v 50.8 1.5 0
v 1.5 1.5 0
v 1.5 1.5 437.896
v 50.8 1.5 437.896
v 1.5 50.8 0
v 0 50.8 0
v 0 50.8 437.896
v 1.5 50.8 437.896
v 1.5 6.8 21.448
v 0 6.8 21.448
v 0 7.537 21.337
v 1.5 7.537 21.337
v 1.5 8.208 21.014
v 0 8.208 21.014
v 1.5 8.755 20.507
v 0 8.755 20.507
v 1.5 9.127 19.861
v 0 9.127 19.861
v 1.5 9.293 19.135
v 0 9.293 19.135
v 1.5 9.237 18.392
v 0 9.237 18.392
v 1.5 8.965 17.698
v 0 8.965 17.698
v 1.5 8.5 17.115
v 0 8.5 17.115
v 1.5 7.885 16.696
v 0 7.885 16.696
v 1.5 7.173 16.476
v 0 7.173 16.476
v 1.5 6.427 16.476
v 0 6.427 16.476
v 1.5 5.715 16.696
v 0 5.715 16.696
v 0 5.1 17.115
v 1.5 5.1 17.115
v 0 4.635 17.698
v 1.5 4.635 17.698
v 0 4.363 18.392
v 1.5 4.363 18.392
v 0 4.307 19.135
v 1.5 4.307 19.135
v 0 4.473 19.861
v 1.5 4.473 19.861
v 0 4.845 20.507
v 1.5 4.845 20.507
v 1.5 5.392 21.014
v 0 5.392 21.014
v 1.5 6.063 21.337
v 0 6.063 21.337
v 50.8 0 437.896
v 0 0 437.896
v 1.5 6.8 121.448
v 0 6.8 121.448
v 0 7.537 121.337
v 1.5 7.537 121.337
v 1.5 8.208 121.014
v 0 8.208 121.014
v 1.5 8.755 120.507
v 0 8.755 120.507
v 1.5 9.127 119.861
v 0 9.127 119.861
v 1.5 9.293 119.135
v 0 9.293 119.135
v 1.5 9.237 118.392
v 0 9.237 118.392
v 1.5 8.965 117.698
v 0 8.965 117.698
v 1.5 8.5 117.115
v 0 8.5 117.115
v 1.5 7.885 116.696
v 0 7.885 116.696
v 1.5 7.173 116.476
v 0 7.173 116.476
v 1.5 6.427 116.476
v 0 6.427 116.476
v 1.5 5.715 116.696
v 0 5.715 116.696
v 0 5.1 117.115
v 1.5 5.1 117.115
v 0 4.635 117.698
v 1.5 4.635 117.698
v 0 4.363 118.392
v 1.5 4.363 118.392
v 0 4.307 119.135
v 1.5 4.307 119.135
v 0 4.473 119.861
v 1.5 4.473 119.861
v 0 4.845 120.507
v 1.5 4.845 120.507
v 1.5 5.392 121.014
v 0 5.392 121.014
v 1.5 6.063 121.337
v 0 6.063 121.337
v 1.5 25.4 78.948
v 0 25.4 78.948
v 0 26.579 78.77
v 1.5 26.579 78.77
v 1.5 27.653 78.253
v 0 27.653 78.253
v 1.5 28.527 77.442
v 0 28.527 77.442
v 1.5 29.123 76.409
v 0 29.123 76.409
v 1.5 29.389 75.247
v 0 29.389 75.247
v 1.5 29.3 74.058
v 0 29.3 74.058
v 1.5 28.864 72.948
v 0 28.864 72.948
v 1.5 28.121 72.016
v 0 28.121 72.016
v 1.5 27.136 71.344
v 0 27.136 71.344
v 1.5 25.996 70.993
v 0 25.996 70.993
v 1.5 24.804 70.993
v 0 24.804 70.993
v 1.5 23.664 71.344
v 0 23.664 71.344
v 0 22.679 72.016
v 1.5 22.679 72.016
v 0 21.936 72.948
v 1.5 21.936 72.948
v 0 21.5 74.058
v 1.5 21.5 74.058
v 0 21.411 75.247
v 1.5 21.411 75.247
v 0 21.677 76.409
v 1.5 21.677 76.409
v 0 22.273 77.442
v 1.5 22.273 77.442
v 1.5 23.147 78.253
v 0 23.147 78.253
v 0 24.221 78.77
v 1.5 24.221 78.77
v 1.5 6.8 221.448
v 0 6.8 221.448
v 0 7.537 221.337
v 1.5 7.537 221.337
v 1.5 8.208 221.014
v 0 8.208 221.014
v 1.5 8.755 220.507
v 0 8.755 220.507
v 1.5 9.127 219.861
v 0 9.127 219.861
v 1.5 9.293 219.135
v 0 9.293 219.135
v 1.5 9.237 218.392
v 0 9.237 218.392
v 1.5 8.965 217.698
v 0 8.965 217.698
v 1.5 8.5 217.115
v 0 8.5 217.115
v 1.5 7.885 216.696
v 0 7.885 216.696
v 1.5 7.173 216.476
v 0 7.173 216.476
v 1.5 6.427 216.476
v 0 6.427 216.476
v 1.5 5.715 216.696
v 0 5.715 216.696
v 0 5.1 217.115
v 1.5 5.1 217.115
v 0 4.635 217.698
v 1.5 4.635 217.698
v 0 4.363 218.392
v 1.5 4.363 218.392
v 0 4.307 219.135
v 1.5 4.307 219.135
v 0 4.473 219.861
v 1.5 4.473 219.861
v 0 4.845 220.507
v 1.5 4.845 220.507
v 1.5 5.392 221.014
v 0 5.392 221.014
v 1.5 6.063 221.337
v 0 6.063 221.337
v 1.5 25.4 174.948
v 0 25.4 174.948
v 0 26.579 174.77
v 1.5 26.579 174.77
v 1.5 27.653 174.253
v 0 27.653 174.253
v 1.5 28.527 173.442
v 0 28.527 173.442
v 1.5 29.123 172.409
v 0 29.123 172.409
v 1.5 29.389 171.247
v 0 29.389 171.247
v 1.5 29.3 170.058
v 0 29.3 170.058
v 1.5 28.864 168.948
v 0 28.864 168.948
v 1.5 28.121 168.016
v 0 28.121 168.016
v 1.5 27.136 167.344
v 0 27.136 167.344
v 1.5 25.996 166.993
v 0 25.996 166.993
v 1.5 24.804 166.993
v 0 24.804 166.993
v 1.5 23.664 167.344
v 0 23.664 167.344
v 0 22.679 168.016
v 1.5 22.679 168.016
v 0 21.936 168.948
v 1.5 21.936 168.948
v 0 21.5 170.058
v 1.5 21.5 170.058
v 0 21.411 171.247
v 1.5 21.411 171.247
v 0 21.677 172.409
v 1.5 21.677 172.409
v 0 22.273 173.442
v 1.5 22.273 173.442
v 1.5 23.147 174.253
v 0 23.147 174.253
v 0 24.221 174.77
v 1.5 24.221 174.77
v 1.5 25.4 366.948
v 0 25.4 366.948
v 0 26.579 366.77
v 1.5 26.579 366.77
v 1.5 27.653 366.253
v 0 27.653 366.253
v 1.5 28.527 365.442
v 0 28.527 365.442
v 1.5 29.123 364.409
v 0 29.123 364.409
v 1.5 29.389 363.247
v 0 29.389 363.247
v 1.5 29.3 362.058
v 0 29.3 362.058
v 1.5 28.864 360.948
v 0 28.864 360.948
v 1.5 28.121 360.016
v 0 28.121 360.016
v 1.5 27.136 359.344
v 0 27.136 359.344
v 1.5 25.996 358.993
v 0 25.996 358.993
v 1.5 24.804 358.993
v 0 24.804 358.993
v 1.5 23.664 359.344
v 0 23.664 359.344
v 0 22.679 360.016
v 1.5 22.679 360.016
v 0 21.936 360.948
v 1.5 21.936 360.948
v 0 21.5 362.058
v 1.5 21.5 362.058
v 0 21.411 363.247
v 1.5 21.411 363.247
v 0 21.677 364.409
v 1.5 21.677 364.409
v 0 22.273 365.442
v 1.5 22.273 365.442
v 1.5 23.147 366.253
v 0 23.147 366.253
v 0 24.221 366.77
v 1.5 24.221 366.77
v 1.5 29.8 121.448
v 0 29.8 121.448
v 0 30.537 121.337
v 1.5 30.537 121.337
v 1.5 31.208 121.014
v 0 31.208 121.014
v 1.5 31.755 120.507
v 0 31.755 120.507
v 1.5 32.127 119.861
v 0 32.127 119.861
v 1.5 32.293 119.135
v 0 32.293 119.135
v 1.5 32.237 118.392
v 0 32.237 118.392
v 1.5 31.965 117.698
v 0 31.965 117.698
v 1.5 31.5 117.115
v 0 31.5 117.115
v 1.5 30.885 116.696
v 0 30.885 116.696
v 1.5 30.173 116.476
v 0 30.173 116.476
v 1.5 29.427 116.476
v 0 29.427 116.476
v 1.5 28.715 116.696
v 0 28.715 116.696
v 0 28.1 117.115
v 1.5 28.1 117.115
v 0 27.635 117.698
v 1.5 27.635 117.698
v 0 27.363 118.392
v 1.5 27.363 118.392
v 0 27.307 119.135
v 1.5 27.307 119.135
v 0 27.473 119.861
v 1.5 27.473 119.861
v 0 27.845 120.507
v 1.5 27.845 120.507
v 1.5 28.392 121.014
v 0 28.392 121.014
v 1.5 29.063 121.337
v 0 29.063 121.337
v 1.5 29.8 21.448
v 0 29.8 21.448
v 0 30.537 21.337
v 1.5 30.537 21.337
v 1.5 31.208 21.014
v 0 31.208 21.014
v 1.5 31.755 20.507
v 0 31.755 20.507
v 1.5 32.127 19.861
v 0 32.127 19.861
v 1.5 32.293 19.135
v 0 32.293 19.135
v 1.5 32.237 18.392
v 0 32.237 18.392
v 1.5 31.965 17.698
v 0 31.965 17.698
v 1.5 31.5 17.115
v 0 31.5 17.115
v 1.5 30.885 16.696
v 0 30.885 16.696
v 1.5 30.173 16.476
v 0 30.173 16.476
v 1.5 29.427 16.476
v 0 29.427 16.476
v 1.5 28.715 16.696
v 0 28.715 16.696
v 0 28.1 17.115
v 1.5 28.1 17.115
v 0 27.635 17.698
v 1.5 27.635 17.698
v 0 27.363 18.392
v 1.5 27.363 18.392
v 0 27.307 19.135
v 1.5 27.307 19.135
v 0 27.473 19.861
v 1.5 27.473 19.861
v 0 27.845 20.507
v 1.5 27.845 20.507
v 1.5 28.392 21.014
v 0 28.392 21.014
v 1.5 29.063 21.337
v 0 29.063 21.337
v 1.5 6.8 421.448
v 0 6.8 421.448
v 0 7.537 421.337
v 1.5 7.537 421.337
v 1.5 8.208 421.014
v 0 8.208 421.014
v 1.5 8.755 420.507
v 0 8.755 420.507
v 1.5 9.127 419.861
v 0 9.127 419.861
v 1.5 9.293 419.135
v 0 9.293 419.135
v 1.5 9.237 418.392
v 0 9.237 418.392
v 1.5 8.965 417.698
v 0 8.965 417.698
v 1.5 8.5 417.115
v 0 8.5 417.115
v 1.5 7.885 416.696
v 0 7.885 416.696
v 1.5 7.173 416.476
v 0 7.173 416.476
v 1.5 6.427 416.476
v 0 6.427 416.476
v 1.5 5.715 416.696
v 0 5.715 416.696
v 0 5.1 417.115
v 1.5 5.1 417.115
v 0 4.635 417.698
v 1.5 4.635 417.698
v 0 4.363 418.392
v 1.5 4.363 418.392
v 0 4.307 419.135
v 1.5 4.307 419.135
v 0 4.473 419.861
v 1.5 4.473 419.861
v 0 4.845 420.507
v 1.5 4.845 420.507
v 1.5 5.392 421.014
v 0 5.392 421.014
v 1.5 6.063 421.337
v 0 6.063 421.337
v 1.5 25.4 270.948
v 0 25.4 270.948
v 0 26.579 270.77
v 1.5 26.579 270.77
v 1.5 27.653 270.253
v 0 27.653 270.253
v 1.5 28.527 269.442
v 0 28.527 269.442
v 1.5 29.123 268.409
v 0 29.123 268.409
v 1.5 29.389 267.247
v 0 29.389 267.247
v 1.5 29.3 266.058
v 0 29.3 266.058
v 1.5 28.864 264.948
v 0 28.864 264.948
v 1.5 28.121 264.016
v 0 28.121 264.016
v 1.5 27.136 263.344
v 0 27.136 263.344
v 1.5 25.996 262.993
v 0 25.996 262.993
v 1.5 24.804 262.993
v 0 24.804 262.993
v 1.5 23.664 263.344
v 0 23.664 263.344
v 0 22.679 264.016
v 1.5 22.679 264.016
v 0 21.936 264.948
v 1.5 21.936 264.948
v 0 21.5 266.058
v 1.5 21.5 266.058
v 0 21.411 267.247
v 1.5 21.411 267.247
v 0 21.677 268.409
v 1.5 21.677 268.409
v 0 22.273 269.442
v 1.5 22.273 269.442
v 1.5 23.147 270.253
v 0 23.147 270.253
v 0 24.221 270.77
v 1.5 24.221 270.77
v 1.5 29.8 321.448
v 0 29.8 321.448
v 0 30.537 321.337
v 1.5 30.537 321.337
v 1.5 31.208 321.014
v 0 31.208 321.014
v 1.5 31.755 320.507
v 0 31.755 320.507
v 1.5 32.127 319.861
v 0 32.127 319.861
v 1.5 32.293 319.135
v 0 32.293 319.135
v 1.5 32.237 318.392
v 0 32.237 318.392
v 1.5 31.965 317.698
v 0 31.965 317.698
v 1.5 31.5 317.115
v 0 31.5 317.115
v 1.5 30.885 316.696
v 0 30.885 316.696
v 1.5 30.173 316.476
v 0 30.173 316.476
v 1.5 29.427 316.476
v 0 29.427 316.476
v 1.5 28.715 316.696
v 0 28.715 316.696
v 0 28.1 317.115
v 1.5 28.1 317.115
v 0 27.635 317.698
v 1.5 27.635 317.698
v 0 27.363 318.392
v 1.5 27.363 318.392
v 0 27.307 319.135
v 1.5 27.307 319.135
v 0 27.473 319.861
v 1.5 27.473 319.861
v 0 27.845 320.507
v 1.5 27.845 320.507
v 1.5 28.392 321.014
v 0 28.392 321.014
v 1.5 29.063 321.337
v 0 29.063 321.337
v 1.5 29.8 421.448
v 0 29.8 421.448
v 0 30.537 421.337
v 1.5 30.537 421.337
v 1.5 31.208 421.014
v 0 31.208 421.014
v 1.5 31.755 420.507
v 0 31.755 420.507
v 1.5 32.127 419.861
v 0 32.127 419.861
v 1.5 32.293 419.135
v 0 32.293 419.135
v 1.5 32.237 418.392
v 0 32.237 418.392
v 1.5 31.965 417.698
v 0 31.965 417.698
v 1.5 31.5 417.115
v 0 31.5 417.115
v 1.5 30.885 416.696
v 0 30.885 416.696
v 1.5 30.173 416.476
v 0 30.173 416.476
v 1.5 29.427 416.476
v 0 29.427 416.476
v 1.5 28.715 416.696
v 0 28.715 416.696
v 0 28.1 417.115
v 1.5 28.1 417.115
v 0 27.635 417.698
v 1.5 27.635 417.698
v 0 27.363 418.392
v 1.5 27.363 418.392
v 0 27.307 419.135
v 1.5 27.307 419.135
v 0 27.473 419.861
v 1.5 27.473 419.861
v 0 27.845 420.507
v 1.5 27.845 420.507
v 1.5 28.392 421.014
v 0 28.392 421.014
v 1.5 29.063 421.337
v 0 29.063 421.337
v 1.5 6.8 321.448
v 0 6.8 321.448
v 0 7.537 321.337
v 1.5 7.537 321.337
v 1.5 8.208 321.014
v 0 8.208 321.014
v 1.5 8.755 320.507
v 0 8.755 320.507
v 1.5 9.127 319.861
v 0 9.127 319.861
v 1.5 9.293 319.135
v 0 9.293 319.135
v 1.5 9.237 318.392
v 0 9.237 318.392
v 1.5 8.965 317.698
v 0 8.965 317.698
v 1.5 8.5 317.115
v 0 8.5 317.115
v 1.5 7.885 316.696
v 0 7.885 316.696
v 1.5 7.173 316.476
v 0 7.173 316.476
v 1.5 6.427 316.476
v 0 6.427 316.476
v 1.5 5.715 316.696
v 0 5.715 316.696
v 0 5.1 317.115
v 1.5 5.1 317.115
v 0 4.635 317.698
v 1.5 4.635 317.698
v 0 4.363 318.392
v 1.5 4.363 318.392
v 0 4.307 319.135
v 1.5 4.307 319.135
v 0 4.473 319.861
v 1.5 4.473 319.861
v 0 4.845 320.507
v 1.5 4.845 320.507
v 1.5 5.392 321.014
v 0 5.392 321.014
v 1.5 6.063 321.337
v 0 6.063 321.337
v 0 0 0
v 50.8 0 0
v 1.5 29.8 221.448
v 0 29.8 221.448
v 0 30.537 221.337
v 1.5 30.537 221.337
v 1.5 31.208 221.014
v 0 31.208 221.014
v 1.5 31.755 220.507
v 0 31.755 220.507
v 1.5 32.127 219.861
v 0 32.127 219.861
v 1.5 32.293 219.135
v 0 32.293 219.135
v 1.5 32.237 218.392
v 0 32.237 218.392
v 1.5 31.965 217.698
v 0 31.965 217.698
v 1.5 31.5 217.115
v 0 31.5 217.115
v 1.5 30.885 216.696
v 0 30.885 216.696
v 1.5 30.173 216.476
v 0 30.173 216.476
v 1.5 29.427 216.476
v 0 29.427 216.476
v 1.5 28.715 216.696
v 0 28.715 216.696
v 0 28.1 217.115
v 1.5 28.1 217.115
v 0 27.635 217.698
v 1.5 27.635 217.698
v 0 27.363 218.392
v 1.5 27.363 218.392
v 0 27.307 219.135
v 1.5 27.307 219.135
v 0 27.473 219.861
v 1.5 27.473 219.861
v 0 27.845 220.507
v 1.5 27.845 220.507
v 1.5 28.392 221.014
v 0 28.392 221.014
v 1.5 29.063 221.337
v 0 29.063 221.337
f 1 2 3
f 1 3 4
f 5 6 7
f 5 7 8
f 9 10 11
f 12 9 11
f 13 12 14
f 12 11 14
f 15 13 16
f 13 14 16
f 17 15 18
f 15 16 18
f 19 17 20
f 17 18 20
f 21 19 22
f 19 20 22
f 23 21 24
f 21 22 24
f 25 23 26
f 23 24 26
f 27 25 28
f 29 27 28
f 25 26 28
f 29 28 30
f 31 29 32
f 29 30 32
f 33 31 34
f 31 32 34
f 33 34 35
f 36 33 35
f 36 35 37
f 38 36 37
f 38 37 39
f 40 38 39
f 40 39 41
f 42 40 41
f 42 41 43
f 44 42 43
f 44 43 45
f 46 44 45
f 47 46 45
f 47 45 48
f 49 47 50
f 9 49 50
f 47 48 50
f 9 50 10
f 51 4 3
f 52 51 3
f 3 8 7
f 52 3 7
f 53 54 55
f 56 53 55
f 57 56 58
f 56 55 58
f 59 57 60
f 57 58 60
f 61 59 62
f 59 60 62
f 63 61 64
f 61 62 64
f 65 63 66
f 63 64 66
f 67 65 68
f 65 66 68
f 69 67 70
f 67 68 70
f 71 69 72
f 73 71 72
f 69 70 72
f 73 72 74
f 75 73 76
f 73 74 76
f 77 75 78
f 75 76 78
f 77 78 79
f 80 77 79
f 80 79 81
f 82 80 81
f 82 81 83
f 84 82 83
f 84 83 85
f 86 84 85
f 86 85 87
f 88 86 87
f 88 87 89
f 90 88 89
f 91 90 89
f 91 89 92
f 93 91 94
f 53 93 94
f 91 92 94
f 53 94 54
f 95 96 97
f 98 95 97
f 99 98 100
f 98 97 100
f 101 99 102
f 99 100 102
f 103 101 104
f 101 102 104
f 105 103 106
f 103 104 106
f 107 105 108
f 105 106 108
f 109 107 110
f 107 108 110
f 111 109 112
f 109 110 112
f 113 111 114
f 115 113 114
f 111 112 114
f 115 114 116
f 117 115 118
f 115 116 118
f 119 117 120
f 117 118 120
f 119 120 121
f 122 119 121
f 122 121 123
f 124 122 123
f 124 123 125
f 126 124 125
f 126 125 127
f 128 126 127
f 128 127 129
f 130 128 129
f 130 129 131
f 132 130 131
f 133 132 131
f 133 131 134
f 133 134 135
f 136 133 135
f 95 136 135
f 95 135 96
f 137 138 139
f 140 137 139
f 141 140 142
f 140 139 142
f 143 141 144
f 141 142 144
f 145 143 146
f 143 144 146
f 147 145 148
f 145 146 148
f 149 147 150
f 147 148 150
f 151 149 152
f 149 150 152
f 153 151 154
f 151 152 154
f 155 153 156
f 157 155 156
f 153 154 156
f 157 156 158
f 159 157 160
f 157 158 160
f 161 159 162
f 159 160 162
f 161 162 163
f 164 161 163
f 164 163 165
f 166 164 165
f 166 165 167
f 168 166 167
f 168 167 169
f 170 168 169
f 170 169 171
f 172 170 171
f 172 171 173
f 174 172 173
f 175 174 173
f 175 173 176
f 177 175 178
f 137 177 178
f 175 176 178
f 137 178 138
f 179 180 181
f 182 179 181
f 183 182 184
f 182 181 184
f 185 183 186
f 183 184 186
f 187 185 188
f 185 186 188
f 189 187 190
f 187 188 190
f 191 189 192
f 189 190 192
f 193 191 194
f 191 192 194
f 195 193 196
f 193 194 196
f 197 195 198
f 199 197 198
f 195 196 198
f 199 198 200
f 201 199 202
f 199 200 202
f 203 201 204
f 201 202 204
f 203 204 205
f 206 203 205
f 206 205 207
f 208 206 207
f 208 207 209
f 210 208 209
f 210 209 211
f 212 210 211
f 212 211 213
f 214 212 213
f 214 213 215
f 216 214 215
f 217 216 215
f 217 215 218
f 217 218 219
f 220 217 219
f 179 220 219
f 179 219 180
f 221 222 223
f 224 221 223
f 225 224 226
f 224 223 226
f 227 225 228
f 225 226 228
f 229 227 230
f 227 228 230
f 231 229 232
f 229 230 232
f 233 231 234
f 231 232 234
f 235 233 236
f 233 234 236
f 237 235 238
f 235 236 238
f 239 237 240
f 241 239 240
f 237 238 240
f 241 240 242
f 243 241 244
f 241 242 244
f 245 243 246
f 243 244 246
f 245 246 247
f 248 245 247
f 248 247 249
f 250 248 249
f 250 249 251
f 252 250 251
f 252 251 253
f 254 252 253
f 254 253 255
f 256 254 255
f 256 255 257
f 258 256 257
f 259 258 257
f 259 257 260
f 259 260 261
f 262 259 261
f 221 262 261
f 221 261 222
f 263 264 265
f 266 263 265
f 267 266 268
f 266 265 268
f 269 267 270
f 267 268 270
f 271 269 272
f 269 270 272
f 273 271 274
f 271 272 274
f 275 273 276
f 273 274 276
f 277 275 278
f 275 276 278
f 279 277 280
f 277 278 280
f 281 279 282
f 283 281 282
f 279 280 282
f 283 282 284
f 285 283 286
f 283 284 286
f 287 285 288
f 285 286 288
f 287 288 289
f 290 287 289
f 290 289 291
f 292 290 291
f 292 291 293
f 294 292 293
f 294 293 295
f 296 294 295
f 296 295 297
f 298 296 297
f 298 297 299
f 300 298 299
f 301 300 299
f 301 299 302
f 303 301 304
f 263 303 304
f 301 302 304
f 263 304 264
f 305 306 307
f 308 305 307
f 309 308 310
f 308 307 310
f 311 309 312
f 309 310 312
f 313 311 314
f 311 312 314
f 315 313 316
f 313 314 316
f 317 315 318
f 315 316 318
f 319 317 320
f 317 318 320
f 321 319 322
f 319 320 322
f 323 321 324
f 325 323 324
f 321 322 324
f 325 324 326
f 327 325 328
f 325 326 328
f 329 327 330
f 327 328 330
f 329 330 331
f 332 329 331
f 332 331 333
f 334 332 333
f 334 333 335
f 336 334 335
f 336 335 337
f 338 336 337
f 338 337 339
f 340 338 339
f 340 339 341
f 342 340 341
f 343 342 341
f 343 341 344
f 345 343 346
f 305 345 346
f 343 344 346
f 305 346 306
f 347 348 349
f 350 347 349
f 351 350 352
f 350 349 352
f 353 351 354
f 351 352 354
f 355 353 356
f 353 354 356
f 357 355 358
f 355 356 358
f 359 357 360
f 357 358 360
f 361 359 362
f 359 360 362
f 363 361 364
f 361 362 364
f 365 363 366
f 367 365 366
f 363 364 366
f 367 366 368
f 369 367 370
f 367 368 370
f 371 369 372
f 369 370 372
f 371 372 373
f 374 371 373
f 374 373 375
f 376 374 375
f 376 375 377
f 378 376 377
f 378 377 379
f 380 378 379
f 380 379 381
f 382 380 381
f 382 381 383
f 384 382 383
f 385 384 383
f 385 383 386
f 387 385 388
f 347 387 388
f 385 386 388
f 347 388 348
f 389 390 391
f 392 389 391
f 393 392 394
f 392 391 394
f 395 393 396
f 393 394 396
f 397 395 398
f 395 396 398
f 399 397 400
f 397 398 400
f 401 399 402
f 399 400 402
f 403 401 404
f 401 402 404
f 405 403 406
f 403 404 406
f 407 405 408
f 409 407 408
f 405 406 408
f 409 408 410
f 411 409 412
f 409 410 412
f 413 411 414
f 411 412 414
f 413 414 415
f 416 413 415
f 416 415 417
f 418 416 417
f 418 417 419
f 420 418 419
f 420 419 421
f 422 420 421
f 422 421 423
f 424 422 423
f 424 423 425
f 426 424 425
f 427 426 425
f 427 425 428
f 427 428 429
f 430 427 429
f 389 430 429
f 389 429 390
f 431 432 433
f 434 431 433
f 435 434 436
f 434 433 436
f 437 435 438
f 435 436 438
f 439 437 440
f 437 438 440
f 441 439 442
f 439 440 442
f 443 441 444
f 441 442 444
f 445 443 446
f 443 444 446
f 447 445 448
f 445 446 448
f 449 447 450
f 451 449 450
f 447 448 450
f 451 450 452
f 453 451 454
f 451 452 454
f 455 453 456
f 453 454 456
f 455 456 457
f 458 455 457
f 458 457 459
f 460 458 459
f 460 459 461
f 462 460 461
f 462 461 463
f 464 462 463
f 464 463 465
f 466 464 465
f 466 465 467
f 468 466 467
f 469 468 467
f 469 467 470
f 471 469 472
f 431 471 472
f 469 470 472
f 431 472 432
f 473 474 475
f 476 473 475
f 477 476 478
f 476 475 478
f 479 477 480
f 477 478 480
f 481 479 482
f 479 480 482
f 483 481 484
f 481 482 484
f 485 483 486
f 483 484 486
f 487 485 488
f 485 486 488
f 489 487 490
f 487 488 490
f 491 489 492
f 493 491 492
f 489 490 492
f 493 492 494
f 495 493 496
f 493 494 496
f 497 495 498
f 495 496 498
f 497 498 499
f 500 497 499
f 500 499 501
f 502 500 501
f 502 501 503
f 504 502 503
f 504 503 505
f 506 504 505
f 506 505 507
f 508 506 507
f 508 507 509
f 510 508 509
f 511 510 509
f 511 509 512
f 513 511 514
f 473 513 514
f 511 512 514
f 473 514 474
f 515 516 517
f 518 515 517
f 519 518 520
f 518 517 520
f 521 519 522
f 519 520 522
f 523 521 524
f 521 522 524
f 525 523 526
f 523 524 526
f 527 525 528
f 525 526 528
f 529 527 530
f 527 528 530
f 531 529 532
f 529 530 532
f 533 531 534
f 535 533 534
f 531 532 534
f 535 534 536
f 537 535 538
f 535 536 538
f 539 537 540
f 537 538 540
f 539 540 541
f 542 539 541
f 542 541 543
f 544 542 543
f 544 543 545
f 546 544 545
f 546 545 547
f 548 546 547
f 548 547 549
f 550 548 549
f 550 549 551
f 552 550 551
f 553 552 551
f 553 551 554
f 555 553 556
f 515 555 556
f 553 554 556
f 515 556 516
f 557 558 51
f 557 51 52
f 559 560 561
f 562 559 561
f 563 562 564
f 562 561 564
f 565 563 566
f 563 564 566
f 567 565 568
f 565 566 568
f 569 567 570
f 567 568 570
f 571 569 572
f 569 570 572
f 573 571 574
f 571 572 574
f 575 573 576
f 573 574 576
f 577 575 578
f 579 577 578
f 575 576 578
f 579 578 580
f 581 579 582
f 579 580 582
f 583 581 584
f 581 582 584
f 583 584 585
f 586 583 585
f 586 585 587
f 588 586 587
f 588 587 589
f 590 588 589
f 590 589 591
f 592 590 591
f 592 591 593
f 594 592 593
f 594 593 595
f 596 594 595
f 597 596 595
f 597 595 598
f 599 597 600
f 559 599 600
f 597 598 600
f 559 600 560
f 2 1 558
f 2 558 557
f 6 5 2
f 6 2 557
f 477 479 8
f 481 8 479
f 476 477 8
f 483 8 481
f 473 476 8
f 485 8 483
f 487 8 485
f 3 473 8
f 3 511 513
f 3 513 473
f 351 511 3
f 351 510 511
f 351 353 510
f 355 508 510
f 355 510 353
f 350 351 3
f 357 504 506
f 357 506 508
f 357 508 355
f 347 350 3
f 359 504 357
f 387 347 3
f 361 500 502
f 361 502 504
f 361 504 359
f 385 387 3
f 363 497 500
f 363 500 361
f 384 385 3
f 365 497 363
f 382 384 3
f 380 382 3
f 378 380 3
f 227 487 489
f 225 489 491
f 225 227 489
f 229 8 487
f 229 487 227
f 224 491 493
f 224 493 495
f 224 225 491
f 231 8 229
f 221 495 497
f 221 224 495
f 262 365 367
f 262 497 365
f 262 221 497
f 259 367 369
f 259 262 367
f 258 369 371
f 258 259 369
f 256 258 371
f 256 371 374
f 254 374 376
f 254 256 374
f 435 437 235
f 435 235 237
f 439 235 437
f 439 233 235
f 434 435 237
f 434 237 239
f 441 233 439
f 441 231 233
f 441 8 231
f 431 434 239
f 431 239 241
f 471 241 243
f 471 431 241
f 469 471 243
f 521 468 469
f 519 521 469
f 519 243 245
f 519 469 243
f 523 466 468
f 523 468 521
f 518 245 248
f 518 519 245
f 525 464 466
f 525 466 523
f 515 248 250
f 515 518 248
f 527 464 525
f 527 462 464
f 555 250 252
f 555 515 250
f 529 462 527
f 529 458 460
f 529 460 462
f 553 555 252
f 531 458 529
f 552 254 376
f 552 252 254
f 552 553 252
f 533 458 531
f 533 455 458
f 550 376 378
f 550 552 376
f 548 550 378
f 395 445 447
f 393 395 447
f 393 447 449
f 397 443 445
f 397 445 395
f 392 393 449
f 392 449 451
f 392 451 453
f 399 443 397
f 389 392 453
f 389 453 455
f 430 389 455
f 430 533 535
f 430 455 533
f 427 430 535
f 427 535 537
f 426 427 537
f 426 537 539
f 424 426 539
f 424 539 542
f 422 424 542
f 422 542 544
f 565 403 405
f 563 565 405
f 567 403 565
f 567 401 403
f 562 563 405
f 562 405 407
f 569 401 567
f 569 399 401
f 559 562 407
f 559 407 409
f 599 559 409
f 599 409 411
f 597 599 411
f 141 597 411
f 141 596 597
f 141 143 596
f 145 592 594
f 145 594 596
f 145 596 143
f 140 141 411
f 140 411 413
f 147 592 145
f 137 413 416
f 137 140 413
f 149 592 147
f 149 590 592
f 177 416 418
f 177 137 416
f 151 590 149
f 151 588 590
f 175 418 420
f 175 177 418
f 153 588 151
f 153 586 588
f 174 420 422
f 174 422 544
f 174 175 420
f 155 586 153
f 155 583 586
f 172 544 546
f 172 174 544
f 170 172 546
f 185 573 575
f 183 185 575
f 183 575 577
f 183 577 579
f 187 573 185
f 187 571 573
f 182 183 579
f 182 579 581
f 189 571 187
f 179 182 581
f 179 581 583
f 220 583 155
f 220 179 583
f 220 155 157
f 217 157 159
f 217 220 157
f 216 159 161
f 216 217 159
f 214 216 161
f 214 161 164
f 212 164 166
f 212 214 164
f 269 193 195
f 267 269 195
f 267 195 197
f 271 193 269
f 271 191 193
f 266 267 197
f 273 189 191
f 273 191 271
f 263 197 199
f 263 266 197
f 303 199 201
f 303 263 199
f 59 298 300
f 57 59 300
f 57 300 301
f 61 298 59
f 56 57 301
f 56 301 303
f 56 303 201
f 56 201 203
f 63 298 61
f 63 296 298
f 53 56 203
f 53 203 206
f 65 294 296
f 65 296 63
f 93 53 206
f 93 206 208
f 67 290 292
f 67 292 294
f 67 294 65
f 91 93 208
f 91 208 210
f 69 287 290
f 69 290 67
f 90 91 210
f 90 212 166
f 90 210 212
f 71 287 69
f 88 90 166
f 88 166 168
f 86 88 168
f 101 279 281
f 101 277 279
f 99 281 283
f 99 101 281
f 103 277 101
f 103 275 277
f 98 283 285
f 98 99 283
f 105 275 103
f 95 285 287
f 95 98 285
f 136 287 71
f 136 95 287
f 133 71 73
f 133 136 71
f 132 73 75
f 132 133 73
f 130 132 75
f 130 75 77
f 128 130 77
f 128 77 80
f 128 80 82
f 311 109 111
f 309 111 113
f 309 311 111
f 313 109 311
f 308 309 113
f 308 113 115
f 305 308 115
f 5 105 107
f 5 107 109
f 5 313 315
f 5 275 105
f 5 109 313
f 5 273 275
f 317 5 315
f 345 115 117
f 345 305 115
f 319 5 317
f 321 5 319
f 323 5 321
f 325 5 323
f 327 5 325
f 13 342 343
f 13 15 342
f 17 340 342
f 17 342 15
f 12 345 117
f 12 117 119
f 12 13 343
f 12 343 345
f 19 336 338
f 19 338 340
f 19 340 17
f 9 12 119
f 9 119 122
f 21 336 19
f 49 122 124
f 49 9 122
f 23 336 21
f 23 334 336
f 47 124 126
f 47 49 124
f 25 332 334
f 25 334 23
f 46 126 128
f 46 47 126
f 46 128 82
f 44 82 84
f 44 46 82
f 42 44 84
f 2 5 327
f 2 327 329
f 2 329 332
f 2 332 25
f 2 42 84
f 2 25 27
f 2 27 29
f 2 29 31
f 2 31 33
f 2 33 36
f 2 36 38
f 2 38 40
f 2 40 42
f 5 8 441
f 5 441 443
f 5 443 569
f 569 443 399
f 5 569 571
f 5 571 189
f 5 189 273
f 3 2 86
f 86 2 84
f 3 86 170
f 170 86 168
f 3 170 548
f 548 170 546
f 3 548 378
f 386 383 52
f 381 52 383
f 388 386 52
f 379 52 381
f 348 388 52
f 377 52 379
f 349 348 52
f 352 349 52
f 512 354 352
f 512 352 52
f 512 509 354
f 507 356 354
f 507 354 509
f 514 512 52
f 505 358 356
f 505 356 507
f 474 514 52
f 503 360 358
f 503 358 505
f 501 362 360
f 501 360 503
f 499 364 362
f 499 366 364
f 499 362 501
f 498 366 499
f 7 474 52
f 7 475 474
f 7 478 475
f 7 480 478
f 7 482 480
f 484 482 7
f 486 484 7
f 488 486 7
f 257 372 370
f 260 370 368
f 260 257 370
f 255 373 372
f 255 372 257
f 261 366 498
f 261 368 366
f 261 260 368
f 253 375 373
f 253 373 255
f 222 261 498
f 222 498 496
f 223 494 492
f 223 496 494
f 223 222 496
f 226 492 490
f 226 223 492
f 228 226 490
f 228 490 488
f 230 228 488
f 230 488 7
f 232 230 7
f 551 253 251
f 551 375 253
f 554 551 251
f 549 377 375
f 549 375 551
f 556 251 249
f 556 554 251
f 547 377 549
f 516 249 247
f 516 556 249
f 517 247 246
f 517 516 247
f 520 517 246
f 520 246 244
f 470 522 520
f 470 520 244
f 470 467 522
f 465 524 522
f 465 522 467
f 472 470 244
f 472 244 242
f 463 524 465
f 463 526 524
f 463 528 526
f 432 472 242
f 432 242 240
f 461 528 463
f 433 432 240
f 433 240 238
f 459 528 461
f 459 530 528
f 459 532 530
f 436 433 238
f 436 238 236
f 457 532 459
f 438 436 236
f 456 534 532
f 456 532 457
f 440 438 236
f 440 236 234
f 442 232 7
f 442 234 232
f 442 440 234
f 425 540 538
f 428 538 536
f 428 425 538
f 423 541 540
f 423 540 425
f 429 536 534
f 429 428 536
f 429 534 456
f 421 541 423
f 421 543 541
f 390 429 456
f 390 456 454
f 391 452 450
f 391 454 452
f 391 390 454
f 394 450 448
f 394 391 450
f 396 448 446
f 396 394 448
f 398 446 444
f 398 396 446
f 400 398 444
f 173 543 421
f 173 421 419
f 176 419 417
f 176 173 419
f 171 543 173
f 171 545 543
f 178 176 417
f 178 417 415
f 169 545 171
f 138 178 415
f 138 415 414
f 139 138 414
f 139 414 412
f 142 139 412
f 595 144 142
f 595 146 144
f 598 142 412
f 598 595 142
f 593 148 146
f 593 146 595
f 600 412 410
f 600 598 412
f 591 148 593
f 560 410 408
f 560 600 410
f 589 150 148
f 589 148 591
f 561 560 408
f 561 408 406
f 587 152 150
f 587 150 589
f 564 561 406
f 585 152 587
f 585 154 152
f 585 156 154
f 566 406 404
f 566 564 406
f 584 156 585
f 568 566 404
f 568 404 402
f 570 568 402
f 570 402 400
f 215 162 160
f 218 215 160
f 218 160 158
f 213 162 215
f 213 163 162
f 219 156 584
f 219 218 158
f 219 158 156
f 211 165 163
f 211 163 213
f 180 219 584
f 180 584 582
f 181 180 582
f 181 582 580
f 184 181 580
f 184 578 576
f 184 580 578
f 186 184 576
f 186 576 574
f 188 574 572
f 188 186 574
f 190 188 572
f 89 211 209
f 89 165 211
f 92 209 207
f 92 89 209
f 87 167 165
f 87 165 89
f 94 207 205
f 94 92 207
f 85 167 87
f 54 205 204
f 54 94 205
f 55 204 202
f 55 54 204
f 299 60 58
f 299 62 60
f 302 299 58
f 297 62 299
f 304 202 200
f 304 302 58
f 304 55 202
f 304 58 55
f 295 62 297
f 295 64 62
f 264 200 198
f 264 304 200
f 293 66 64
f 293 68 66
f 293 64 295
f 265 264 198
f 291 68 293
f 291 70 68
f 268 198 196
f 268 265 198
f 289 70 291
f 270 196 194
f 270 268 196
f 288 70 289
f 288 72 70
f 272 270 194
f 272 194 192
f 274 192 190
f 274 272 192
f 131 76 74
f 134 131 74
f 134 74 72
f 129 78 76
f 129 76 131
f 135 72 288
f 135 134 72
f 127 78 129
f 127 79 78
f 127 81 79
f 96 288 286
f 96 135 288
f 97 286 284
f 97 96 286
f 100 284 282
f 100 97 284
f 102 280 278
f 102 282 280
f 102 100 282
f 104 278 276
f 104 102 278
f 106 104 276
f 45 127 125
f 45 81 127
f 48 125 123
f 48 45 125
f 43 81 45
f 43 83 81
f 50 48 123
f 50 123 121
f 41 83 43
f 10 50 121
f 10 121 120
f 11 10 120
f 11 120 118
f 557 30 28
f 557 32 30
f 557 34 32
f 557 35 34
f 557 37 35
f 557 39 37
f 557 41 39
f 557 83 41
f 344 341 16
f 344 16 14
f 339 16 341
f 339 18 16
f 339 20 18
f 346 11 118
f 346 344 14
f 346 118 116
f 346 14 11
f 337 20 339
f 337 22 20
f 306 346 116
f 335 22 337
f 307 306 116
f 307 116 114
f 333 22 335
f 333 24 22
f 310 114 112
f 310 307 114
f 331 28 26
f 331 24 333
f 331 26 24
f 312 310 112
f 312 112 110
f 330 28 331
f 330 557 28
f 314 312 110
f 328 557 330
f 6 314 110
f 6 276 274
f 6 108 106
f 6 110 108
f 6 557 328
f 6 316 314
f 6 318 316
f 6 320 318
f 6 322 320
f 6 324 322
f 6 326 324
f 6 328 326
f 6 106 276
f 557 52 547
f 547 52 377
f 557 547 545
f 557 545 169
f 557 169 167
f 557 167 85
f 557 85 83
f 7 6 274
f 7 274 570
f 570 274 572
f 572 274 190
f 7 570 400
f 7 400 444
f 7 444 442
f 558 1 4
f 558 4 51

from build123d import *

# Parameters (mm, degrees)
SALIENTE_EXTRUIR1_DEPTH = 437.896
CROQUIS2_R              = 3.999992
CORTAR_EXTRUIR1_DEPTH   = 4.064
CROQUIS3_R              = 2.5
CORTAR_EXTRUIR2_DEPTH   = 1.499997


with BuildPart() as part:
    # Croquis1 → Saliente-Extruir1 (new body)
    with BuildSketch(Plane.XY):
        Polygon((0, 0), (0, 50.8), (1.499997, 50.8), (1.499997, 1.499997), (50.8, 1.499997), (50.8, 0), align=None)
    extrude(amount=SALIENTE_EXTRUIR1_DEPTH)

    # Croquis2 → Cortar-Extruir1 (cut)
    with BuildSketch(Plane.ZY):
        with Locations((266.948, 25.4)):
            Circle(CROQUIS2_R)
        with Locations((362.948, 25.4)):
            Circle(CROQUIS2_R)
        with Locations((74.948, 25.4)):
            Circle(CROQUIS2_R)
        with Locations((170.948, 25.4)):
            Circle(CROQUIS2_R)
    extrude(amount=-CORTAR_EXTRUIR1_DEPTH, mode=Mode.SUBTRACT)

    # Croquis3 → Cortar-Extruir2 (cut)
    with BuildSketch(Plane.ZY):
        with Locations((18.948, 29.8)):
            Circle(CROQUIS3_R)
        with Locations((118.948, 29.8)):
            Circle(CROQUIS3_R)
        with Locations((218.948, 29.8)):
            Circle(CROQUIS3_R)
        with Locations((318.948, 29.8)):
            Circle(CROQUIS3_R)
        with Locations((418.948, 29.8)):
            Circle(CROQUIS3_R)
        with Locations((18.948, 6.8)):
            Circle(CROQUIS3_R)
        with Locations((218.948, 6.8)):
            Circle(CROQUIS3_R)
        with Locations((118.948, 6.8)):
            Circle(CROQUIS3_R)
        with Locations((318.948, 6.8)):
            Circle(CROQUIS3_R)
        with Locations((418.948, 6.8)):
            Circle(CROQUIS3_R)
    extrude(amount=-CORTAR_EXTRUIR2_DEPTH, mode=Mode.SUBTRACT)


solid = part.part
